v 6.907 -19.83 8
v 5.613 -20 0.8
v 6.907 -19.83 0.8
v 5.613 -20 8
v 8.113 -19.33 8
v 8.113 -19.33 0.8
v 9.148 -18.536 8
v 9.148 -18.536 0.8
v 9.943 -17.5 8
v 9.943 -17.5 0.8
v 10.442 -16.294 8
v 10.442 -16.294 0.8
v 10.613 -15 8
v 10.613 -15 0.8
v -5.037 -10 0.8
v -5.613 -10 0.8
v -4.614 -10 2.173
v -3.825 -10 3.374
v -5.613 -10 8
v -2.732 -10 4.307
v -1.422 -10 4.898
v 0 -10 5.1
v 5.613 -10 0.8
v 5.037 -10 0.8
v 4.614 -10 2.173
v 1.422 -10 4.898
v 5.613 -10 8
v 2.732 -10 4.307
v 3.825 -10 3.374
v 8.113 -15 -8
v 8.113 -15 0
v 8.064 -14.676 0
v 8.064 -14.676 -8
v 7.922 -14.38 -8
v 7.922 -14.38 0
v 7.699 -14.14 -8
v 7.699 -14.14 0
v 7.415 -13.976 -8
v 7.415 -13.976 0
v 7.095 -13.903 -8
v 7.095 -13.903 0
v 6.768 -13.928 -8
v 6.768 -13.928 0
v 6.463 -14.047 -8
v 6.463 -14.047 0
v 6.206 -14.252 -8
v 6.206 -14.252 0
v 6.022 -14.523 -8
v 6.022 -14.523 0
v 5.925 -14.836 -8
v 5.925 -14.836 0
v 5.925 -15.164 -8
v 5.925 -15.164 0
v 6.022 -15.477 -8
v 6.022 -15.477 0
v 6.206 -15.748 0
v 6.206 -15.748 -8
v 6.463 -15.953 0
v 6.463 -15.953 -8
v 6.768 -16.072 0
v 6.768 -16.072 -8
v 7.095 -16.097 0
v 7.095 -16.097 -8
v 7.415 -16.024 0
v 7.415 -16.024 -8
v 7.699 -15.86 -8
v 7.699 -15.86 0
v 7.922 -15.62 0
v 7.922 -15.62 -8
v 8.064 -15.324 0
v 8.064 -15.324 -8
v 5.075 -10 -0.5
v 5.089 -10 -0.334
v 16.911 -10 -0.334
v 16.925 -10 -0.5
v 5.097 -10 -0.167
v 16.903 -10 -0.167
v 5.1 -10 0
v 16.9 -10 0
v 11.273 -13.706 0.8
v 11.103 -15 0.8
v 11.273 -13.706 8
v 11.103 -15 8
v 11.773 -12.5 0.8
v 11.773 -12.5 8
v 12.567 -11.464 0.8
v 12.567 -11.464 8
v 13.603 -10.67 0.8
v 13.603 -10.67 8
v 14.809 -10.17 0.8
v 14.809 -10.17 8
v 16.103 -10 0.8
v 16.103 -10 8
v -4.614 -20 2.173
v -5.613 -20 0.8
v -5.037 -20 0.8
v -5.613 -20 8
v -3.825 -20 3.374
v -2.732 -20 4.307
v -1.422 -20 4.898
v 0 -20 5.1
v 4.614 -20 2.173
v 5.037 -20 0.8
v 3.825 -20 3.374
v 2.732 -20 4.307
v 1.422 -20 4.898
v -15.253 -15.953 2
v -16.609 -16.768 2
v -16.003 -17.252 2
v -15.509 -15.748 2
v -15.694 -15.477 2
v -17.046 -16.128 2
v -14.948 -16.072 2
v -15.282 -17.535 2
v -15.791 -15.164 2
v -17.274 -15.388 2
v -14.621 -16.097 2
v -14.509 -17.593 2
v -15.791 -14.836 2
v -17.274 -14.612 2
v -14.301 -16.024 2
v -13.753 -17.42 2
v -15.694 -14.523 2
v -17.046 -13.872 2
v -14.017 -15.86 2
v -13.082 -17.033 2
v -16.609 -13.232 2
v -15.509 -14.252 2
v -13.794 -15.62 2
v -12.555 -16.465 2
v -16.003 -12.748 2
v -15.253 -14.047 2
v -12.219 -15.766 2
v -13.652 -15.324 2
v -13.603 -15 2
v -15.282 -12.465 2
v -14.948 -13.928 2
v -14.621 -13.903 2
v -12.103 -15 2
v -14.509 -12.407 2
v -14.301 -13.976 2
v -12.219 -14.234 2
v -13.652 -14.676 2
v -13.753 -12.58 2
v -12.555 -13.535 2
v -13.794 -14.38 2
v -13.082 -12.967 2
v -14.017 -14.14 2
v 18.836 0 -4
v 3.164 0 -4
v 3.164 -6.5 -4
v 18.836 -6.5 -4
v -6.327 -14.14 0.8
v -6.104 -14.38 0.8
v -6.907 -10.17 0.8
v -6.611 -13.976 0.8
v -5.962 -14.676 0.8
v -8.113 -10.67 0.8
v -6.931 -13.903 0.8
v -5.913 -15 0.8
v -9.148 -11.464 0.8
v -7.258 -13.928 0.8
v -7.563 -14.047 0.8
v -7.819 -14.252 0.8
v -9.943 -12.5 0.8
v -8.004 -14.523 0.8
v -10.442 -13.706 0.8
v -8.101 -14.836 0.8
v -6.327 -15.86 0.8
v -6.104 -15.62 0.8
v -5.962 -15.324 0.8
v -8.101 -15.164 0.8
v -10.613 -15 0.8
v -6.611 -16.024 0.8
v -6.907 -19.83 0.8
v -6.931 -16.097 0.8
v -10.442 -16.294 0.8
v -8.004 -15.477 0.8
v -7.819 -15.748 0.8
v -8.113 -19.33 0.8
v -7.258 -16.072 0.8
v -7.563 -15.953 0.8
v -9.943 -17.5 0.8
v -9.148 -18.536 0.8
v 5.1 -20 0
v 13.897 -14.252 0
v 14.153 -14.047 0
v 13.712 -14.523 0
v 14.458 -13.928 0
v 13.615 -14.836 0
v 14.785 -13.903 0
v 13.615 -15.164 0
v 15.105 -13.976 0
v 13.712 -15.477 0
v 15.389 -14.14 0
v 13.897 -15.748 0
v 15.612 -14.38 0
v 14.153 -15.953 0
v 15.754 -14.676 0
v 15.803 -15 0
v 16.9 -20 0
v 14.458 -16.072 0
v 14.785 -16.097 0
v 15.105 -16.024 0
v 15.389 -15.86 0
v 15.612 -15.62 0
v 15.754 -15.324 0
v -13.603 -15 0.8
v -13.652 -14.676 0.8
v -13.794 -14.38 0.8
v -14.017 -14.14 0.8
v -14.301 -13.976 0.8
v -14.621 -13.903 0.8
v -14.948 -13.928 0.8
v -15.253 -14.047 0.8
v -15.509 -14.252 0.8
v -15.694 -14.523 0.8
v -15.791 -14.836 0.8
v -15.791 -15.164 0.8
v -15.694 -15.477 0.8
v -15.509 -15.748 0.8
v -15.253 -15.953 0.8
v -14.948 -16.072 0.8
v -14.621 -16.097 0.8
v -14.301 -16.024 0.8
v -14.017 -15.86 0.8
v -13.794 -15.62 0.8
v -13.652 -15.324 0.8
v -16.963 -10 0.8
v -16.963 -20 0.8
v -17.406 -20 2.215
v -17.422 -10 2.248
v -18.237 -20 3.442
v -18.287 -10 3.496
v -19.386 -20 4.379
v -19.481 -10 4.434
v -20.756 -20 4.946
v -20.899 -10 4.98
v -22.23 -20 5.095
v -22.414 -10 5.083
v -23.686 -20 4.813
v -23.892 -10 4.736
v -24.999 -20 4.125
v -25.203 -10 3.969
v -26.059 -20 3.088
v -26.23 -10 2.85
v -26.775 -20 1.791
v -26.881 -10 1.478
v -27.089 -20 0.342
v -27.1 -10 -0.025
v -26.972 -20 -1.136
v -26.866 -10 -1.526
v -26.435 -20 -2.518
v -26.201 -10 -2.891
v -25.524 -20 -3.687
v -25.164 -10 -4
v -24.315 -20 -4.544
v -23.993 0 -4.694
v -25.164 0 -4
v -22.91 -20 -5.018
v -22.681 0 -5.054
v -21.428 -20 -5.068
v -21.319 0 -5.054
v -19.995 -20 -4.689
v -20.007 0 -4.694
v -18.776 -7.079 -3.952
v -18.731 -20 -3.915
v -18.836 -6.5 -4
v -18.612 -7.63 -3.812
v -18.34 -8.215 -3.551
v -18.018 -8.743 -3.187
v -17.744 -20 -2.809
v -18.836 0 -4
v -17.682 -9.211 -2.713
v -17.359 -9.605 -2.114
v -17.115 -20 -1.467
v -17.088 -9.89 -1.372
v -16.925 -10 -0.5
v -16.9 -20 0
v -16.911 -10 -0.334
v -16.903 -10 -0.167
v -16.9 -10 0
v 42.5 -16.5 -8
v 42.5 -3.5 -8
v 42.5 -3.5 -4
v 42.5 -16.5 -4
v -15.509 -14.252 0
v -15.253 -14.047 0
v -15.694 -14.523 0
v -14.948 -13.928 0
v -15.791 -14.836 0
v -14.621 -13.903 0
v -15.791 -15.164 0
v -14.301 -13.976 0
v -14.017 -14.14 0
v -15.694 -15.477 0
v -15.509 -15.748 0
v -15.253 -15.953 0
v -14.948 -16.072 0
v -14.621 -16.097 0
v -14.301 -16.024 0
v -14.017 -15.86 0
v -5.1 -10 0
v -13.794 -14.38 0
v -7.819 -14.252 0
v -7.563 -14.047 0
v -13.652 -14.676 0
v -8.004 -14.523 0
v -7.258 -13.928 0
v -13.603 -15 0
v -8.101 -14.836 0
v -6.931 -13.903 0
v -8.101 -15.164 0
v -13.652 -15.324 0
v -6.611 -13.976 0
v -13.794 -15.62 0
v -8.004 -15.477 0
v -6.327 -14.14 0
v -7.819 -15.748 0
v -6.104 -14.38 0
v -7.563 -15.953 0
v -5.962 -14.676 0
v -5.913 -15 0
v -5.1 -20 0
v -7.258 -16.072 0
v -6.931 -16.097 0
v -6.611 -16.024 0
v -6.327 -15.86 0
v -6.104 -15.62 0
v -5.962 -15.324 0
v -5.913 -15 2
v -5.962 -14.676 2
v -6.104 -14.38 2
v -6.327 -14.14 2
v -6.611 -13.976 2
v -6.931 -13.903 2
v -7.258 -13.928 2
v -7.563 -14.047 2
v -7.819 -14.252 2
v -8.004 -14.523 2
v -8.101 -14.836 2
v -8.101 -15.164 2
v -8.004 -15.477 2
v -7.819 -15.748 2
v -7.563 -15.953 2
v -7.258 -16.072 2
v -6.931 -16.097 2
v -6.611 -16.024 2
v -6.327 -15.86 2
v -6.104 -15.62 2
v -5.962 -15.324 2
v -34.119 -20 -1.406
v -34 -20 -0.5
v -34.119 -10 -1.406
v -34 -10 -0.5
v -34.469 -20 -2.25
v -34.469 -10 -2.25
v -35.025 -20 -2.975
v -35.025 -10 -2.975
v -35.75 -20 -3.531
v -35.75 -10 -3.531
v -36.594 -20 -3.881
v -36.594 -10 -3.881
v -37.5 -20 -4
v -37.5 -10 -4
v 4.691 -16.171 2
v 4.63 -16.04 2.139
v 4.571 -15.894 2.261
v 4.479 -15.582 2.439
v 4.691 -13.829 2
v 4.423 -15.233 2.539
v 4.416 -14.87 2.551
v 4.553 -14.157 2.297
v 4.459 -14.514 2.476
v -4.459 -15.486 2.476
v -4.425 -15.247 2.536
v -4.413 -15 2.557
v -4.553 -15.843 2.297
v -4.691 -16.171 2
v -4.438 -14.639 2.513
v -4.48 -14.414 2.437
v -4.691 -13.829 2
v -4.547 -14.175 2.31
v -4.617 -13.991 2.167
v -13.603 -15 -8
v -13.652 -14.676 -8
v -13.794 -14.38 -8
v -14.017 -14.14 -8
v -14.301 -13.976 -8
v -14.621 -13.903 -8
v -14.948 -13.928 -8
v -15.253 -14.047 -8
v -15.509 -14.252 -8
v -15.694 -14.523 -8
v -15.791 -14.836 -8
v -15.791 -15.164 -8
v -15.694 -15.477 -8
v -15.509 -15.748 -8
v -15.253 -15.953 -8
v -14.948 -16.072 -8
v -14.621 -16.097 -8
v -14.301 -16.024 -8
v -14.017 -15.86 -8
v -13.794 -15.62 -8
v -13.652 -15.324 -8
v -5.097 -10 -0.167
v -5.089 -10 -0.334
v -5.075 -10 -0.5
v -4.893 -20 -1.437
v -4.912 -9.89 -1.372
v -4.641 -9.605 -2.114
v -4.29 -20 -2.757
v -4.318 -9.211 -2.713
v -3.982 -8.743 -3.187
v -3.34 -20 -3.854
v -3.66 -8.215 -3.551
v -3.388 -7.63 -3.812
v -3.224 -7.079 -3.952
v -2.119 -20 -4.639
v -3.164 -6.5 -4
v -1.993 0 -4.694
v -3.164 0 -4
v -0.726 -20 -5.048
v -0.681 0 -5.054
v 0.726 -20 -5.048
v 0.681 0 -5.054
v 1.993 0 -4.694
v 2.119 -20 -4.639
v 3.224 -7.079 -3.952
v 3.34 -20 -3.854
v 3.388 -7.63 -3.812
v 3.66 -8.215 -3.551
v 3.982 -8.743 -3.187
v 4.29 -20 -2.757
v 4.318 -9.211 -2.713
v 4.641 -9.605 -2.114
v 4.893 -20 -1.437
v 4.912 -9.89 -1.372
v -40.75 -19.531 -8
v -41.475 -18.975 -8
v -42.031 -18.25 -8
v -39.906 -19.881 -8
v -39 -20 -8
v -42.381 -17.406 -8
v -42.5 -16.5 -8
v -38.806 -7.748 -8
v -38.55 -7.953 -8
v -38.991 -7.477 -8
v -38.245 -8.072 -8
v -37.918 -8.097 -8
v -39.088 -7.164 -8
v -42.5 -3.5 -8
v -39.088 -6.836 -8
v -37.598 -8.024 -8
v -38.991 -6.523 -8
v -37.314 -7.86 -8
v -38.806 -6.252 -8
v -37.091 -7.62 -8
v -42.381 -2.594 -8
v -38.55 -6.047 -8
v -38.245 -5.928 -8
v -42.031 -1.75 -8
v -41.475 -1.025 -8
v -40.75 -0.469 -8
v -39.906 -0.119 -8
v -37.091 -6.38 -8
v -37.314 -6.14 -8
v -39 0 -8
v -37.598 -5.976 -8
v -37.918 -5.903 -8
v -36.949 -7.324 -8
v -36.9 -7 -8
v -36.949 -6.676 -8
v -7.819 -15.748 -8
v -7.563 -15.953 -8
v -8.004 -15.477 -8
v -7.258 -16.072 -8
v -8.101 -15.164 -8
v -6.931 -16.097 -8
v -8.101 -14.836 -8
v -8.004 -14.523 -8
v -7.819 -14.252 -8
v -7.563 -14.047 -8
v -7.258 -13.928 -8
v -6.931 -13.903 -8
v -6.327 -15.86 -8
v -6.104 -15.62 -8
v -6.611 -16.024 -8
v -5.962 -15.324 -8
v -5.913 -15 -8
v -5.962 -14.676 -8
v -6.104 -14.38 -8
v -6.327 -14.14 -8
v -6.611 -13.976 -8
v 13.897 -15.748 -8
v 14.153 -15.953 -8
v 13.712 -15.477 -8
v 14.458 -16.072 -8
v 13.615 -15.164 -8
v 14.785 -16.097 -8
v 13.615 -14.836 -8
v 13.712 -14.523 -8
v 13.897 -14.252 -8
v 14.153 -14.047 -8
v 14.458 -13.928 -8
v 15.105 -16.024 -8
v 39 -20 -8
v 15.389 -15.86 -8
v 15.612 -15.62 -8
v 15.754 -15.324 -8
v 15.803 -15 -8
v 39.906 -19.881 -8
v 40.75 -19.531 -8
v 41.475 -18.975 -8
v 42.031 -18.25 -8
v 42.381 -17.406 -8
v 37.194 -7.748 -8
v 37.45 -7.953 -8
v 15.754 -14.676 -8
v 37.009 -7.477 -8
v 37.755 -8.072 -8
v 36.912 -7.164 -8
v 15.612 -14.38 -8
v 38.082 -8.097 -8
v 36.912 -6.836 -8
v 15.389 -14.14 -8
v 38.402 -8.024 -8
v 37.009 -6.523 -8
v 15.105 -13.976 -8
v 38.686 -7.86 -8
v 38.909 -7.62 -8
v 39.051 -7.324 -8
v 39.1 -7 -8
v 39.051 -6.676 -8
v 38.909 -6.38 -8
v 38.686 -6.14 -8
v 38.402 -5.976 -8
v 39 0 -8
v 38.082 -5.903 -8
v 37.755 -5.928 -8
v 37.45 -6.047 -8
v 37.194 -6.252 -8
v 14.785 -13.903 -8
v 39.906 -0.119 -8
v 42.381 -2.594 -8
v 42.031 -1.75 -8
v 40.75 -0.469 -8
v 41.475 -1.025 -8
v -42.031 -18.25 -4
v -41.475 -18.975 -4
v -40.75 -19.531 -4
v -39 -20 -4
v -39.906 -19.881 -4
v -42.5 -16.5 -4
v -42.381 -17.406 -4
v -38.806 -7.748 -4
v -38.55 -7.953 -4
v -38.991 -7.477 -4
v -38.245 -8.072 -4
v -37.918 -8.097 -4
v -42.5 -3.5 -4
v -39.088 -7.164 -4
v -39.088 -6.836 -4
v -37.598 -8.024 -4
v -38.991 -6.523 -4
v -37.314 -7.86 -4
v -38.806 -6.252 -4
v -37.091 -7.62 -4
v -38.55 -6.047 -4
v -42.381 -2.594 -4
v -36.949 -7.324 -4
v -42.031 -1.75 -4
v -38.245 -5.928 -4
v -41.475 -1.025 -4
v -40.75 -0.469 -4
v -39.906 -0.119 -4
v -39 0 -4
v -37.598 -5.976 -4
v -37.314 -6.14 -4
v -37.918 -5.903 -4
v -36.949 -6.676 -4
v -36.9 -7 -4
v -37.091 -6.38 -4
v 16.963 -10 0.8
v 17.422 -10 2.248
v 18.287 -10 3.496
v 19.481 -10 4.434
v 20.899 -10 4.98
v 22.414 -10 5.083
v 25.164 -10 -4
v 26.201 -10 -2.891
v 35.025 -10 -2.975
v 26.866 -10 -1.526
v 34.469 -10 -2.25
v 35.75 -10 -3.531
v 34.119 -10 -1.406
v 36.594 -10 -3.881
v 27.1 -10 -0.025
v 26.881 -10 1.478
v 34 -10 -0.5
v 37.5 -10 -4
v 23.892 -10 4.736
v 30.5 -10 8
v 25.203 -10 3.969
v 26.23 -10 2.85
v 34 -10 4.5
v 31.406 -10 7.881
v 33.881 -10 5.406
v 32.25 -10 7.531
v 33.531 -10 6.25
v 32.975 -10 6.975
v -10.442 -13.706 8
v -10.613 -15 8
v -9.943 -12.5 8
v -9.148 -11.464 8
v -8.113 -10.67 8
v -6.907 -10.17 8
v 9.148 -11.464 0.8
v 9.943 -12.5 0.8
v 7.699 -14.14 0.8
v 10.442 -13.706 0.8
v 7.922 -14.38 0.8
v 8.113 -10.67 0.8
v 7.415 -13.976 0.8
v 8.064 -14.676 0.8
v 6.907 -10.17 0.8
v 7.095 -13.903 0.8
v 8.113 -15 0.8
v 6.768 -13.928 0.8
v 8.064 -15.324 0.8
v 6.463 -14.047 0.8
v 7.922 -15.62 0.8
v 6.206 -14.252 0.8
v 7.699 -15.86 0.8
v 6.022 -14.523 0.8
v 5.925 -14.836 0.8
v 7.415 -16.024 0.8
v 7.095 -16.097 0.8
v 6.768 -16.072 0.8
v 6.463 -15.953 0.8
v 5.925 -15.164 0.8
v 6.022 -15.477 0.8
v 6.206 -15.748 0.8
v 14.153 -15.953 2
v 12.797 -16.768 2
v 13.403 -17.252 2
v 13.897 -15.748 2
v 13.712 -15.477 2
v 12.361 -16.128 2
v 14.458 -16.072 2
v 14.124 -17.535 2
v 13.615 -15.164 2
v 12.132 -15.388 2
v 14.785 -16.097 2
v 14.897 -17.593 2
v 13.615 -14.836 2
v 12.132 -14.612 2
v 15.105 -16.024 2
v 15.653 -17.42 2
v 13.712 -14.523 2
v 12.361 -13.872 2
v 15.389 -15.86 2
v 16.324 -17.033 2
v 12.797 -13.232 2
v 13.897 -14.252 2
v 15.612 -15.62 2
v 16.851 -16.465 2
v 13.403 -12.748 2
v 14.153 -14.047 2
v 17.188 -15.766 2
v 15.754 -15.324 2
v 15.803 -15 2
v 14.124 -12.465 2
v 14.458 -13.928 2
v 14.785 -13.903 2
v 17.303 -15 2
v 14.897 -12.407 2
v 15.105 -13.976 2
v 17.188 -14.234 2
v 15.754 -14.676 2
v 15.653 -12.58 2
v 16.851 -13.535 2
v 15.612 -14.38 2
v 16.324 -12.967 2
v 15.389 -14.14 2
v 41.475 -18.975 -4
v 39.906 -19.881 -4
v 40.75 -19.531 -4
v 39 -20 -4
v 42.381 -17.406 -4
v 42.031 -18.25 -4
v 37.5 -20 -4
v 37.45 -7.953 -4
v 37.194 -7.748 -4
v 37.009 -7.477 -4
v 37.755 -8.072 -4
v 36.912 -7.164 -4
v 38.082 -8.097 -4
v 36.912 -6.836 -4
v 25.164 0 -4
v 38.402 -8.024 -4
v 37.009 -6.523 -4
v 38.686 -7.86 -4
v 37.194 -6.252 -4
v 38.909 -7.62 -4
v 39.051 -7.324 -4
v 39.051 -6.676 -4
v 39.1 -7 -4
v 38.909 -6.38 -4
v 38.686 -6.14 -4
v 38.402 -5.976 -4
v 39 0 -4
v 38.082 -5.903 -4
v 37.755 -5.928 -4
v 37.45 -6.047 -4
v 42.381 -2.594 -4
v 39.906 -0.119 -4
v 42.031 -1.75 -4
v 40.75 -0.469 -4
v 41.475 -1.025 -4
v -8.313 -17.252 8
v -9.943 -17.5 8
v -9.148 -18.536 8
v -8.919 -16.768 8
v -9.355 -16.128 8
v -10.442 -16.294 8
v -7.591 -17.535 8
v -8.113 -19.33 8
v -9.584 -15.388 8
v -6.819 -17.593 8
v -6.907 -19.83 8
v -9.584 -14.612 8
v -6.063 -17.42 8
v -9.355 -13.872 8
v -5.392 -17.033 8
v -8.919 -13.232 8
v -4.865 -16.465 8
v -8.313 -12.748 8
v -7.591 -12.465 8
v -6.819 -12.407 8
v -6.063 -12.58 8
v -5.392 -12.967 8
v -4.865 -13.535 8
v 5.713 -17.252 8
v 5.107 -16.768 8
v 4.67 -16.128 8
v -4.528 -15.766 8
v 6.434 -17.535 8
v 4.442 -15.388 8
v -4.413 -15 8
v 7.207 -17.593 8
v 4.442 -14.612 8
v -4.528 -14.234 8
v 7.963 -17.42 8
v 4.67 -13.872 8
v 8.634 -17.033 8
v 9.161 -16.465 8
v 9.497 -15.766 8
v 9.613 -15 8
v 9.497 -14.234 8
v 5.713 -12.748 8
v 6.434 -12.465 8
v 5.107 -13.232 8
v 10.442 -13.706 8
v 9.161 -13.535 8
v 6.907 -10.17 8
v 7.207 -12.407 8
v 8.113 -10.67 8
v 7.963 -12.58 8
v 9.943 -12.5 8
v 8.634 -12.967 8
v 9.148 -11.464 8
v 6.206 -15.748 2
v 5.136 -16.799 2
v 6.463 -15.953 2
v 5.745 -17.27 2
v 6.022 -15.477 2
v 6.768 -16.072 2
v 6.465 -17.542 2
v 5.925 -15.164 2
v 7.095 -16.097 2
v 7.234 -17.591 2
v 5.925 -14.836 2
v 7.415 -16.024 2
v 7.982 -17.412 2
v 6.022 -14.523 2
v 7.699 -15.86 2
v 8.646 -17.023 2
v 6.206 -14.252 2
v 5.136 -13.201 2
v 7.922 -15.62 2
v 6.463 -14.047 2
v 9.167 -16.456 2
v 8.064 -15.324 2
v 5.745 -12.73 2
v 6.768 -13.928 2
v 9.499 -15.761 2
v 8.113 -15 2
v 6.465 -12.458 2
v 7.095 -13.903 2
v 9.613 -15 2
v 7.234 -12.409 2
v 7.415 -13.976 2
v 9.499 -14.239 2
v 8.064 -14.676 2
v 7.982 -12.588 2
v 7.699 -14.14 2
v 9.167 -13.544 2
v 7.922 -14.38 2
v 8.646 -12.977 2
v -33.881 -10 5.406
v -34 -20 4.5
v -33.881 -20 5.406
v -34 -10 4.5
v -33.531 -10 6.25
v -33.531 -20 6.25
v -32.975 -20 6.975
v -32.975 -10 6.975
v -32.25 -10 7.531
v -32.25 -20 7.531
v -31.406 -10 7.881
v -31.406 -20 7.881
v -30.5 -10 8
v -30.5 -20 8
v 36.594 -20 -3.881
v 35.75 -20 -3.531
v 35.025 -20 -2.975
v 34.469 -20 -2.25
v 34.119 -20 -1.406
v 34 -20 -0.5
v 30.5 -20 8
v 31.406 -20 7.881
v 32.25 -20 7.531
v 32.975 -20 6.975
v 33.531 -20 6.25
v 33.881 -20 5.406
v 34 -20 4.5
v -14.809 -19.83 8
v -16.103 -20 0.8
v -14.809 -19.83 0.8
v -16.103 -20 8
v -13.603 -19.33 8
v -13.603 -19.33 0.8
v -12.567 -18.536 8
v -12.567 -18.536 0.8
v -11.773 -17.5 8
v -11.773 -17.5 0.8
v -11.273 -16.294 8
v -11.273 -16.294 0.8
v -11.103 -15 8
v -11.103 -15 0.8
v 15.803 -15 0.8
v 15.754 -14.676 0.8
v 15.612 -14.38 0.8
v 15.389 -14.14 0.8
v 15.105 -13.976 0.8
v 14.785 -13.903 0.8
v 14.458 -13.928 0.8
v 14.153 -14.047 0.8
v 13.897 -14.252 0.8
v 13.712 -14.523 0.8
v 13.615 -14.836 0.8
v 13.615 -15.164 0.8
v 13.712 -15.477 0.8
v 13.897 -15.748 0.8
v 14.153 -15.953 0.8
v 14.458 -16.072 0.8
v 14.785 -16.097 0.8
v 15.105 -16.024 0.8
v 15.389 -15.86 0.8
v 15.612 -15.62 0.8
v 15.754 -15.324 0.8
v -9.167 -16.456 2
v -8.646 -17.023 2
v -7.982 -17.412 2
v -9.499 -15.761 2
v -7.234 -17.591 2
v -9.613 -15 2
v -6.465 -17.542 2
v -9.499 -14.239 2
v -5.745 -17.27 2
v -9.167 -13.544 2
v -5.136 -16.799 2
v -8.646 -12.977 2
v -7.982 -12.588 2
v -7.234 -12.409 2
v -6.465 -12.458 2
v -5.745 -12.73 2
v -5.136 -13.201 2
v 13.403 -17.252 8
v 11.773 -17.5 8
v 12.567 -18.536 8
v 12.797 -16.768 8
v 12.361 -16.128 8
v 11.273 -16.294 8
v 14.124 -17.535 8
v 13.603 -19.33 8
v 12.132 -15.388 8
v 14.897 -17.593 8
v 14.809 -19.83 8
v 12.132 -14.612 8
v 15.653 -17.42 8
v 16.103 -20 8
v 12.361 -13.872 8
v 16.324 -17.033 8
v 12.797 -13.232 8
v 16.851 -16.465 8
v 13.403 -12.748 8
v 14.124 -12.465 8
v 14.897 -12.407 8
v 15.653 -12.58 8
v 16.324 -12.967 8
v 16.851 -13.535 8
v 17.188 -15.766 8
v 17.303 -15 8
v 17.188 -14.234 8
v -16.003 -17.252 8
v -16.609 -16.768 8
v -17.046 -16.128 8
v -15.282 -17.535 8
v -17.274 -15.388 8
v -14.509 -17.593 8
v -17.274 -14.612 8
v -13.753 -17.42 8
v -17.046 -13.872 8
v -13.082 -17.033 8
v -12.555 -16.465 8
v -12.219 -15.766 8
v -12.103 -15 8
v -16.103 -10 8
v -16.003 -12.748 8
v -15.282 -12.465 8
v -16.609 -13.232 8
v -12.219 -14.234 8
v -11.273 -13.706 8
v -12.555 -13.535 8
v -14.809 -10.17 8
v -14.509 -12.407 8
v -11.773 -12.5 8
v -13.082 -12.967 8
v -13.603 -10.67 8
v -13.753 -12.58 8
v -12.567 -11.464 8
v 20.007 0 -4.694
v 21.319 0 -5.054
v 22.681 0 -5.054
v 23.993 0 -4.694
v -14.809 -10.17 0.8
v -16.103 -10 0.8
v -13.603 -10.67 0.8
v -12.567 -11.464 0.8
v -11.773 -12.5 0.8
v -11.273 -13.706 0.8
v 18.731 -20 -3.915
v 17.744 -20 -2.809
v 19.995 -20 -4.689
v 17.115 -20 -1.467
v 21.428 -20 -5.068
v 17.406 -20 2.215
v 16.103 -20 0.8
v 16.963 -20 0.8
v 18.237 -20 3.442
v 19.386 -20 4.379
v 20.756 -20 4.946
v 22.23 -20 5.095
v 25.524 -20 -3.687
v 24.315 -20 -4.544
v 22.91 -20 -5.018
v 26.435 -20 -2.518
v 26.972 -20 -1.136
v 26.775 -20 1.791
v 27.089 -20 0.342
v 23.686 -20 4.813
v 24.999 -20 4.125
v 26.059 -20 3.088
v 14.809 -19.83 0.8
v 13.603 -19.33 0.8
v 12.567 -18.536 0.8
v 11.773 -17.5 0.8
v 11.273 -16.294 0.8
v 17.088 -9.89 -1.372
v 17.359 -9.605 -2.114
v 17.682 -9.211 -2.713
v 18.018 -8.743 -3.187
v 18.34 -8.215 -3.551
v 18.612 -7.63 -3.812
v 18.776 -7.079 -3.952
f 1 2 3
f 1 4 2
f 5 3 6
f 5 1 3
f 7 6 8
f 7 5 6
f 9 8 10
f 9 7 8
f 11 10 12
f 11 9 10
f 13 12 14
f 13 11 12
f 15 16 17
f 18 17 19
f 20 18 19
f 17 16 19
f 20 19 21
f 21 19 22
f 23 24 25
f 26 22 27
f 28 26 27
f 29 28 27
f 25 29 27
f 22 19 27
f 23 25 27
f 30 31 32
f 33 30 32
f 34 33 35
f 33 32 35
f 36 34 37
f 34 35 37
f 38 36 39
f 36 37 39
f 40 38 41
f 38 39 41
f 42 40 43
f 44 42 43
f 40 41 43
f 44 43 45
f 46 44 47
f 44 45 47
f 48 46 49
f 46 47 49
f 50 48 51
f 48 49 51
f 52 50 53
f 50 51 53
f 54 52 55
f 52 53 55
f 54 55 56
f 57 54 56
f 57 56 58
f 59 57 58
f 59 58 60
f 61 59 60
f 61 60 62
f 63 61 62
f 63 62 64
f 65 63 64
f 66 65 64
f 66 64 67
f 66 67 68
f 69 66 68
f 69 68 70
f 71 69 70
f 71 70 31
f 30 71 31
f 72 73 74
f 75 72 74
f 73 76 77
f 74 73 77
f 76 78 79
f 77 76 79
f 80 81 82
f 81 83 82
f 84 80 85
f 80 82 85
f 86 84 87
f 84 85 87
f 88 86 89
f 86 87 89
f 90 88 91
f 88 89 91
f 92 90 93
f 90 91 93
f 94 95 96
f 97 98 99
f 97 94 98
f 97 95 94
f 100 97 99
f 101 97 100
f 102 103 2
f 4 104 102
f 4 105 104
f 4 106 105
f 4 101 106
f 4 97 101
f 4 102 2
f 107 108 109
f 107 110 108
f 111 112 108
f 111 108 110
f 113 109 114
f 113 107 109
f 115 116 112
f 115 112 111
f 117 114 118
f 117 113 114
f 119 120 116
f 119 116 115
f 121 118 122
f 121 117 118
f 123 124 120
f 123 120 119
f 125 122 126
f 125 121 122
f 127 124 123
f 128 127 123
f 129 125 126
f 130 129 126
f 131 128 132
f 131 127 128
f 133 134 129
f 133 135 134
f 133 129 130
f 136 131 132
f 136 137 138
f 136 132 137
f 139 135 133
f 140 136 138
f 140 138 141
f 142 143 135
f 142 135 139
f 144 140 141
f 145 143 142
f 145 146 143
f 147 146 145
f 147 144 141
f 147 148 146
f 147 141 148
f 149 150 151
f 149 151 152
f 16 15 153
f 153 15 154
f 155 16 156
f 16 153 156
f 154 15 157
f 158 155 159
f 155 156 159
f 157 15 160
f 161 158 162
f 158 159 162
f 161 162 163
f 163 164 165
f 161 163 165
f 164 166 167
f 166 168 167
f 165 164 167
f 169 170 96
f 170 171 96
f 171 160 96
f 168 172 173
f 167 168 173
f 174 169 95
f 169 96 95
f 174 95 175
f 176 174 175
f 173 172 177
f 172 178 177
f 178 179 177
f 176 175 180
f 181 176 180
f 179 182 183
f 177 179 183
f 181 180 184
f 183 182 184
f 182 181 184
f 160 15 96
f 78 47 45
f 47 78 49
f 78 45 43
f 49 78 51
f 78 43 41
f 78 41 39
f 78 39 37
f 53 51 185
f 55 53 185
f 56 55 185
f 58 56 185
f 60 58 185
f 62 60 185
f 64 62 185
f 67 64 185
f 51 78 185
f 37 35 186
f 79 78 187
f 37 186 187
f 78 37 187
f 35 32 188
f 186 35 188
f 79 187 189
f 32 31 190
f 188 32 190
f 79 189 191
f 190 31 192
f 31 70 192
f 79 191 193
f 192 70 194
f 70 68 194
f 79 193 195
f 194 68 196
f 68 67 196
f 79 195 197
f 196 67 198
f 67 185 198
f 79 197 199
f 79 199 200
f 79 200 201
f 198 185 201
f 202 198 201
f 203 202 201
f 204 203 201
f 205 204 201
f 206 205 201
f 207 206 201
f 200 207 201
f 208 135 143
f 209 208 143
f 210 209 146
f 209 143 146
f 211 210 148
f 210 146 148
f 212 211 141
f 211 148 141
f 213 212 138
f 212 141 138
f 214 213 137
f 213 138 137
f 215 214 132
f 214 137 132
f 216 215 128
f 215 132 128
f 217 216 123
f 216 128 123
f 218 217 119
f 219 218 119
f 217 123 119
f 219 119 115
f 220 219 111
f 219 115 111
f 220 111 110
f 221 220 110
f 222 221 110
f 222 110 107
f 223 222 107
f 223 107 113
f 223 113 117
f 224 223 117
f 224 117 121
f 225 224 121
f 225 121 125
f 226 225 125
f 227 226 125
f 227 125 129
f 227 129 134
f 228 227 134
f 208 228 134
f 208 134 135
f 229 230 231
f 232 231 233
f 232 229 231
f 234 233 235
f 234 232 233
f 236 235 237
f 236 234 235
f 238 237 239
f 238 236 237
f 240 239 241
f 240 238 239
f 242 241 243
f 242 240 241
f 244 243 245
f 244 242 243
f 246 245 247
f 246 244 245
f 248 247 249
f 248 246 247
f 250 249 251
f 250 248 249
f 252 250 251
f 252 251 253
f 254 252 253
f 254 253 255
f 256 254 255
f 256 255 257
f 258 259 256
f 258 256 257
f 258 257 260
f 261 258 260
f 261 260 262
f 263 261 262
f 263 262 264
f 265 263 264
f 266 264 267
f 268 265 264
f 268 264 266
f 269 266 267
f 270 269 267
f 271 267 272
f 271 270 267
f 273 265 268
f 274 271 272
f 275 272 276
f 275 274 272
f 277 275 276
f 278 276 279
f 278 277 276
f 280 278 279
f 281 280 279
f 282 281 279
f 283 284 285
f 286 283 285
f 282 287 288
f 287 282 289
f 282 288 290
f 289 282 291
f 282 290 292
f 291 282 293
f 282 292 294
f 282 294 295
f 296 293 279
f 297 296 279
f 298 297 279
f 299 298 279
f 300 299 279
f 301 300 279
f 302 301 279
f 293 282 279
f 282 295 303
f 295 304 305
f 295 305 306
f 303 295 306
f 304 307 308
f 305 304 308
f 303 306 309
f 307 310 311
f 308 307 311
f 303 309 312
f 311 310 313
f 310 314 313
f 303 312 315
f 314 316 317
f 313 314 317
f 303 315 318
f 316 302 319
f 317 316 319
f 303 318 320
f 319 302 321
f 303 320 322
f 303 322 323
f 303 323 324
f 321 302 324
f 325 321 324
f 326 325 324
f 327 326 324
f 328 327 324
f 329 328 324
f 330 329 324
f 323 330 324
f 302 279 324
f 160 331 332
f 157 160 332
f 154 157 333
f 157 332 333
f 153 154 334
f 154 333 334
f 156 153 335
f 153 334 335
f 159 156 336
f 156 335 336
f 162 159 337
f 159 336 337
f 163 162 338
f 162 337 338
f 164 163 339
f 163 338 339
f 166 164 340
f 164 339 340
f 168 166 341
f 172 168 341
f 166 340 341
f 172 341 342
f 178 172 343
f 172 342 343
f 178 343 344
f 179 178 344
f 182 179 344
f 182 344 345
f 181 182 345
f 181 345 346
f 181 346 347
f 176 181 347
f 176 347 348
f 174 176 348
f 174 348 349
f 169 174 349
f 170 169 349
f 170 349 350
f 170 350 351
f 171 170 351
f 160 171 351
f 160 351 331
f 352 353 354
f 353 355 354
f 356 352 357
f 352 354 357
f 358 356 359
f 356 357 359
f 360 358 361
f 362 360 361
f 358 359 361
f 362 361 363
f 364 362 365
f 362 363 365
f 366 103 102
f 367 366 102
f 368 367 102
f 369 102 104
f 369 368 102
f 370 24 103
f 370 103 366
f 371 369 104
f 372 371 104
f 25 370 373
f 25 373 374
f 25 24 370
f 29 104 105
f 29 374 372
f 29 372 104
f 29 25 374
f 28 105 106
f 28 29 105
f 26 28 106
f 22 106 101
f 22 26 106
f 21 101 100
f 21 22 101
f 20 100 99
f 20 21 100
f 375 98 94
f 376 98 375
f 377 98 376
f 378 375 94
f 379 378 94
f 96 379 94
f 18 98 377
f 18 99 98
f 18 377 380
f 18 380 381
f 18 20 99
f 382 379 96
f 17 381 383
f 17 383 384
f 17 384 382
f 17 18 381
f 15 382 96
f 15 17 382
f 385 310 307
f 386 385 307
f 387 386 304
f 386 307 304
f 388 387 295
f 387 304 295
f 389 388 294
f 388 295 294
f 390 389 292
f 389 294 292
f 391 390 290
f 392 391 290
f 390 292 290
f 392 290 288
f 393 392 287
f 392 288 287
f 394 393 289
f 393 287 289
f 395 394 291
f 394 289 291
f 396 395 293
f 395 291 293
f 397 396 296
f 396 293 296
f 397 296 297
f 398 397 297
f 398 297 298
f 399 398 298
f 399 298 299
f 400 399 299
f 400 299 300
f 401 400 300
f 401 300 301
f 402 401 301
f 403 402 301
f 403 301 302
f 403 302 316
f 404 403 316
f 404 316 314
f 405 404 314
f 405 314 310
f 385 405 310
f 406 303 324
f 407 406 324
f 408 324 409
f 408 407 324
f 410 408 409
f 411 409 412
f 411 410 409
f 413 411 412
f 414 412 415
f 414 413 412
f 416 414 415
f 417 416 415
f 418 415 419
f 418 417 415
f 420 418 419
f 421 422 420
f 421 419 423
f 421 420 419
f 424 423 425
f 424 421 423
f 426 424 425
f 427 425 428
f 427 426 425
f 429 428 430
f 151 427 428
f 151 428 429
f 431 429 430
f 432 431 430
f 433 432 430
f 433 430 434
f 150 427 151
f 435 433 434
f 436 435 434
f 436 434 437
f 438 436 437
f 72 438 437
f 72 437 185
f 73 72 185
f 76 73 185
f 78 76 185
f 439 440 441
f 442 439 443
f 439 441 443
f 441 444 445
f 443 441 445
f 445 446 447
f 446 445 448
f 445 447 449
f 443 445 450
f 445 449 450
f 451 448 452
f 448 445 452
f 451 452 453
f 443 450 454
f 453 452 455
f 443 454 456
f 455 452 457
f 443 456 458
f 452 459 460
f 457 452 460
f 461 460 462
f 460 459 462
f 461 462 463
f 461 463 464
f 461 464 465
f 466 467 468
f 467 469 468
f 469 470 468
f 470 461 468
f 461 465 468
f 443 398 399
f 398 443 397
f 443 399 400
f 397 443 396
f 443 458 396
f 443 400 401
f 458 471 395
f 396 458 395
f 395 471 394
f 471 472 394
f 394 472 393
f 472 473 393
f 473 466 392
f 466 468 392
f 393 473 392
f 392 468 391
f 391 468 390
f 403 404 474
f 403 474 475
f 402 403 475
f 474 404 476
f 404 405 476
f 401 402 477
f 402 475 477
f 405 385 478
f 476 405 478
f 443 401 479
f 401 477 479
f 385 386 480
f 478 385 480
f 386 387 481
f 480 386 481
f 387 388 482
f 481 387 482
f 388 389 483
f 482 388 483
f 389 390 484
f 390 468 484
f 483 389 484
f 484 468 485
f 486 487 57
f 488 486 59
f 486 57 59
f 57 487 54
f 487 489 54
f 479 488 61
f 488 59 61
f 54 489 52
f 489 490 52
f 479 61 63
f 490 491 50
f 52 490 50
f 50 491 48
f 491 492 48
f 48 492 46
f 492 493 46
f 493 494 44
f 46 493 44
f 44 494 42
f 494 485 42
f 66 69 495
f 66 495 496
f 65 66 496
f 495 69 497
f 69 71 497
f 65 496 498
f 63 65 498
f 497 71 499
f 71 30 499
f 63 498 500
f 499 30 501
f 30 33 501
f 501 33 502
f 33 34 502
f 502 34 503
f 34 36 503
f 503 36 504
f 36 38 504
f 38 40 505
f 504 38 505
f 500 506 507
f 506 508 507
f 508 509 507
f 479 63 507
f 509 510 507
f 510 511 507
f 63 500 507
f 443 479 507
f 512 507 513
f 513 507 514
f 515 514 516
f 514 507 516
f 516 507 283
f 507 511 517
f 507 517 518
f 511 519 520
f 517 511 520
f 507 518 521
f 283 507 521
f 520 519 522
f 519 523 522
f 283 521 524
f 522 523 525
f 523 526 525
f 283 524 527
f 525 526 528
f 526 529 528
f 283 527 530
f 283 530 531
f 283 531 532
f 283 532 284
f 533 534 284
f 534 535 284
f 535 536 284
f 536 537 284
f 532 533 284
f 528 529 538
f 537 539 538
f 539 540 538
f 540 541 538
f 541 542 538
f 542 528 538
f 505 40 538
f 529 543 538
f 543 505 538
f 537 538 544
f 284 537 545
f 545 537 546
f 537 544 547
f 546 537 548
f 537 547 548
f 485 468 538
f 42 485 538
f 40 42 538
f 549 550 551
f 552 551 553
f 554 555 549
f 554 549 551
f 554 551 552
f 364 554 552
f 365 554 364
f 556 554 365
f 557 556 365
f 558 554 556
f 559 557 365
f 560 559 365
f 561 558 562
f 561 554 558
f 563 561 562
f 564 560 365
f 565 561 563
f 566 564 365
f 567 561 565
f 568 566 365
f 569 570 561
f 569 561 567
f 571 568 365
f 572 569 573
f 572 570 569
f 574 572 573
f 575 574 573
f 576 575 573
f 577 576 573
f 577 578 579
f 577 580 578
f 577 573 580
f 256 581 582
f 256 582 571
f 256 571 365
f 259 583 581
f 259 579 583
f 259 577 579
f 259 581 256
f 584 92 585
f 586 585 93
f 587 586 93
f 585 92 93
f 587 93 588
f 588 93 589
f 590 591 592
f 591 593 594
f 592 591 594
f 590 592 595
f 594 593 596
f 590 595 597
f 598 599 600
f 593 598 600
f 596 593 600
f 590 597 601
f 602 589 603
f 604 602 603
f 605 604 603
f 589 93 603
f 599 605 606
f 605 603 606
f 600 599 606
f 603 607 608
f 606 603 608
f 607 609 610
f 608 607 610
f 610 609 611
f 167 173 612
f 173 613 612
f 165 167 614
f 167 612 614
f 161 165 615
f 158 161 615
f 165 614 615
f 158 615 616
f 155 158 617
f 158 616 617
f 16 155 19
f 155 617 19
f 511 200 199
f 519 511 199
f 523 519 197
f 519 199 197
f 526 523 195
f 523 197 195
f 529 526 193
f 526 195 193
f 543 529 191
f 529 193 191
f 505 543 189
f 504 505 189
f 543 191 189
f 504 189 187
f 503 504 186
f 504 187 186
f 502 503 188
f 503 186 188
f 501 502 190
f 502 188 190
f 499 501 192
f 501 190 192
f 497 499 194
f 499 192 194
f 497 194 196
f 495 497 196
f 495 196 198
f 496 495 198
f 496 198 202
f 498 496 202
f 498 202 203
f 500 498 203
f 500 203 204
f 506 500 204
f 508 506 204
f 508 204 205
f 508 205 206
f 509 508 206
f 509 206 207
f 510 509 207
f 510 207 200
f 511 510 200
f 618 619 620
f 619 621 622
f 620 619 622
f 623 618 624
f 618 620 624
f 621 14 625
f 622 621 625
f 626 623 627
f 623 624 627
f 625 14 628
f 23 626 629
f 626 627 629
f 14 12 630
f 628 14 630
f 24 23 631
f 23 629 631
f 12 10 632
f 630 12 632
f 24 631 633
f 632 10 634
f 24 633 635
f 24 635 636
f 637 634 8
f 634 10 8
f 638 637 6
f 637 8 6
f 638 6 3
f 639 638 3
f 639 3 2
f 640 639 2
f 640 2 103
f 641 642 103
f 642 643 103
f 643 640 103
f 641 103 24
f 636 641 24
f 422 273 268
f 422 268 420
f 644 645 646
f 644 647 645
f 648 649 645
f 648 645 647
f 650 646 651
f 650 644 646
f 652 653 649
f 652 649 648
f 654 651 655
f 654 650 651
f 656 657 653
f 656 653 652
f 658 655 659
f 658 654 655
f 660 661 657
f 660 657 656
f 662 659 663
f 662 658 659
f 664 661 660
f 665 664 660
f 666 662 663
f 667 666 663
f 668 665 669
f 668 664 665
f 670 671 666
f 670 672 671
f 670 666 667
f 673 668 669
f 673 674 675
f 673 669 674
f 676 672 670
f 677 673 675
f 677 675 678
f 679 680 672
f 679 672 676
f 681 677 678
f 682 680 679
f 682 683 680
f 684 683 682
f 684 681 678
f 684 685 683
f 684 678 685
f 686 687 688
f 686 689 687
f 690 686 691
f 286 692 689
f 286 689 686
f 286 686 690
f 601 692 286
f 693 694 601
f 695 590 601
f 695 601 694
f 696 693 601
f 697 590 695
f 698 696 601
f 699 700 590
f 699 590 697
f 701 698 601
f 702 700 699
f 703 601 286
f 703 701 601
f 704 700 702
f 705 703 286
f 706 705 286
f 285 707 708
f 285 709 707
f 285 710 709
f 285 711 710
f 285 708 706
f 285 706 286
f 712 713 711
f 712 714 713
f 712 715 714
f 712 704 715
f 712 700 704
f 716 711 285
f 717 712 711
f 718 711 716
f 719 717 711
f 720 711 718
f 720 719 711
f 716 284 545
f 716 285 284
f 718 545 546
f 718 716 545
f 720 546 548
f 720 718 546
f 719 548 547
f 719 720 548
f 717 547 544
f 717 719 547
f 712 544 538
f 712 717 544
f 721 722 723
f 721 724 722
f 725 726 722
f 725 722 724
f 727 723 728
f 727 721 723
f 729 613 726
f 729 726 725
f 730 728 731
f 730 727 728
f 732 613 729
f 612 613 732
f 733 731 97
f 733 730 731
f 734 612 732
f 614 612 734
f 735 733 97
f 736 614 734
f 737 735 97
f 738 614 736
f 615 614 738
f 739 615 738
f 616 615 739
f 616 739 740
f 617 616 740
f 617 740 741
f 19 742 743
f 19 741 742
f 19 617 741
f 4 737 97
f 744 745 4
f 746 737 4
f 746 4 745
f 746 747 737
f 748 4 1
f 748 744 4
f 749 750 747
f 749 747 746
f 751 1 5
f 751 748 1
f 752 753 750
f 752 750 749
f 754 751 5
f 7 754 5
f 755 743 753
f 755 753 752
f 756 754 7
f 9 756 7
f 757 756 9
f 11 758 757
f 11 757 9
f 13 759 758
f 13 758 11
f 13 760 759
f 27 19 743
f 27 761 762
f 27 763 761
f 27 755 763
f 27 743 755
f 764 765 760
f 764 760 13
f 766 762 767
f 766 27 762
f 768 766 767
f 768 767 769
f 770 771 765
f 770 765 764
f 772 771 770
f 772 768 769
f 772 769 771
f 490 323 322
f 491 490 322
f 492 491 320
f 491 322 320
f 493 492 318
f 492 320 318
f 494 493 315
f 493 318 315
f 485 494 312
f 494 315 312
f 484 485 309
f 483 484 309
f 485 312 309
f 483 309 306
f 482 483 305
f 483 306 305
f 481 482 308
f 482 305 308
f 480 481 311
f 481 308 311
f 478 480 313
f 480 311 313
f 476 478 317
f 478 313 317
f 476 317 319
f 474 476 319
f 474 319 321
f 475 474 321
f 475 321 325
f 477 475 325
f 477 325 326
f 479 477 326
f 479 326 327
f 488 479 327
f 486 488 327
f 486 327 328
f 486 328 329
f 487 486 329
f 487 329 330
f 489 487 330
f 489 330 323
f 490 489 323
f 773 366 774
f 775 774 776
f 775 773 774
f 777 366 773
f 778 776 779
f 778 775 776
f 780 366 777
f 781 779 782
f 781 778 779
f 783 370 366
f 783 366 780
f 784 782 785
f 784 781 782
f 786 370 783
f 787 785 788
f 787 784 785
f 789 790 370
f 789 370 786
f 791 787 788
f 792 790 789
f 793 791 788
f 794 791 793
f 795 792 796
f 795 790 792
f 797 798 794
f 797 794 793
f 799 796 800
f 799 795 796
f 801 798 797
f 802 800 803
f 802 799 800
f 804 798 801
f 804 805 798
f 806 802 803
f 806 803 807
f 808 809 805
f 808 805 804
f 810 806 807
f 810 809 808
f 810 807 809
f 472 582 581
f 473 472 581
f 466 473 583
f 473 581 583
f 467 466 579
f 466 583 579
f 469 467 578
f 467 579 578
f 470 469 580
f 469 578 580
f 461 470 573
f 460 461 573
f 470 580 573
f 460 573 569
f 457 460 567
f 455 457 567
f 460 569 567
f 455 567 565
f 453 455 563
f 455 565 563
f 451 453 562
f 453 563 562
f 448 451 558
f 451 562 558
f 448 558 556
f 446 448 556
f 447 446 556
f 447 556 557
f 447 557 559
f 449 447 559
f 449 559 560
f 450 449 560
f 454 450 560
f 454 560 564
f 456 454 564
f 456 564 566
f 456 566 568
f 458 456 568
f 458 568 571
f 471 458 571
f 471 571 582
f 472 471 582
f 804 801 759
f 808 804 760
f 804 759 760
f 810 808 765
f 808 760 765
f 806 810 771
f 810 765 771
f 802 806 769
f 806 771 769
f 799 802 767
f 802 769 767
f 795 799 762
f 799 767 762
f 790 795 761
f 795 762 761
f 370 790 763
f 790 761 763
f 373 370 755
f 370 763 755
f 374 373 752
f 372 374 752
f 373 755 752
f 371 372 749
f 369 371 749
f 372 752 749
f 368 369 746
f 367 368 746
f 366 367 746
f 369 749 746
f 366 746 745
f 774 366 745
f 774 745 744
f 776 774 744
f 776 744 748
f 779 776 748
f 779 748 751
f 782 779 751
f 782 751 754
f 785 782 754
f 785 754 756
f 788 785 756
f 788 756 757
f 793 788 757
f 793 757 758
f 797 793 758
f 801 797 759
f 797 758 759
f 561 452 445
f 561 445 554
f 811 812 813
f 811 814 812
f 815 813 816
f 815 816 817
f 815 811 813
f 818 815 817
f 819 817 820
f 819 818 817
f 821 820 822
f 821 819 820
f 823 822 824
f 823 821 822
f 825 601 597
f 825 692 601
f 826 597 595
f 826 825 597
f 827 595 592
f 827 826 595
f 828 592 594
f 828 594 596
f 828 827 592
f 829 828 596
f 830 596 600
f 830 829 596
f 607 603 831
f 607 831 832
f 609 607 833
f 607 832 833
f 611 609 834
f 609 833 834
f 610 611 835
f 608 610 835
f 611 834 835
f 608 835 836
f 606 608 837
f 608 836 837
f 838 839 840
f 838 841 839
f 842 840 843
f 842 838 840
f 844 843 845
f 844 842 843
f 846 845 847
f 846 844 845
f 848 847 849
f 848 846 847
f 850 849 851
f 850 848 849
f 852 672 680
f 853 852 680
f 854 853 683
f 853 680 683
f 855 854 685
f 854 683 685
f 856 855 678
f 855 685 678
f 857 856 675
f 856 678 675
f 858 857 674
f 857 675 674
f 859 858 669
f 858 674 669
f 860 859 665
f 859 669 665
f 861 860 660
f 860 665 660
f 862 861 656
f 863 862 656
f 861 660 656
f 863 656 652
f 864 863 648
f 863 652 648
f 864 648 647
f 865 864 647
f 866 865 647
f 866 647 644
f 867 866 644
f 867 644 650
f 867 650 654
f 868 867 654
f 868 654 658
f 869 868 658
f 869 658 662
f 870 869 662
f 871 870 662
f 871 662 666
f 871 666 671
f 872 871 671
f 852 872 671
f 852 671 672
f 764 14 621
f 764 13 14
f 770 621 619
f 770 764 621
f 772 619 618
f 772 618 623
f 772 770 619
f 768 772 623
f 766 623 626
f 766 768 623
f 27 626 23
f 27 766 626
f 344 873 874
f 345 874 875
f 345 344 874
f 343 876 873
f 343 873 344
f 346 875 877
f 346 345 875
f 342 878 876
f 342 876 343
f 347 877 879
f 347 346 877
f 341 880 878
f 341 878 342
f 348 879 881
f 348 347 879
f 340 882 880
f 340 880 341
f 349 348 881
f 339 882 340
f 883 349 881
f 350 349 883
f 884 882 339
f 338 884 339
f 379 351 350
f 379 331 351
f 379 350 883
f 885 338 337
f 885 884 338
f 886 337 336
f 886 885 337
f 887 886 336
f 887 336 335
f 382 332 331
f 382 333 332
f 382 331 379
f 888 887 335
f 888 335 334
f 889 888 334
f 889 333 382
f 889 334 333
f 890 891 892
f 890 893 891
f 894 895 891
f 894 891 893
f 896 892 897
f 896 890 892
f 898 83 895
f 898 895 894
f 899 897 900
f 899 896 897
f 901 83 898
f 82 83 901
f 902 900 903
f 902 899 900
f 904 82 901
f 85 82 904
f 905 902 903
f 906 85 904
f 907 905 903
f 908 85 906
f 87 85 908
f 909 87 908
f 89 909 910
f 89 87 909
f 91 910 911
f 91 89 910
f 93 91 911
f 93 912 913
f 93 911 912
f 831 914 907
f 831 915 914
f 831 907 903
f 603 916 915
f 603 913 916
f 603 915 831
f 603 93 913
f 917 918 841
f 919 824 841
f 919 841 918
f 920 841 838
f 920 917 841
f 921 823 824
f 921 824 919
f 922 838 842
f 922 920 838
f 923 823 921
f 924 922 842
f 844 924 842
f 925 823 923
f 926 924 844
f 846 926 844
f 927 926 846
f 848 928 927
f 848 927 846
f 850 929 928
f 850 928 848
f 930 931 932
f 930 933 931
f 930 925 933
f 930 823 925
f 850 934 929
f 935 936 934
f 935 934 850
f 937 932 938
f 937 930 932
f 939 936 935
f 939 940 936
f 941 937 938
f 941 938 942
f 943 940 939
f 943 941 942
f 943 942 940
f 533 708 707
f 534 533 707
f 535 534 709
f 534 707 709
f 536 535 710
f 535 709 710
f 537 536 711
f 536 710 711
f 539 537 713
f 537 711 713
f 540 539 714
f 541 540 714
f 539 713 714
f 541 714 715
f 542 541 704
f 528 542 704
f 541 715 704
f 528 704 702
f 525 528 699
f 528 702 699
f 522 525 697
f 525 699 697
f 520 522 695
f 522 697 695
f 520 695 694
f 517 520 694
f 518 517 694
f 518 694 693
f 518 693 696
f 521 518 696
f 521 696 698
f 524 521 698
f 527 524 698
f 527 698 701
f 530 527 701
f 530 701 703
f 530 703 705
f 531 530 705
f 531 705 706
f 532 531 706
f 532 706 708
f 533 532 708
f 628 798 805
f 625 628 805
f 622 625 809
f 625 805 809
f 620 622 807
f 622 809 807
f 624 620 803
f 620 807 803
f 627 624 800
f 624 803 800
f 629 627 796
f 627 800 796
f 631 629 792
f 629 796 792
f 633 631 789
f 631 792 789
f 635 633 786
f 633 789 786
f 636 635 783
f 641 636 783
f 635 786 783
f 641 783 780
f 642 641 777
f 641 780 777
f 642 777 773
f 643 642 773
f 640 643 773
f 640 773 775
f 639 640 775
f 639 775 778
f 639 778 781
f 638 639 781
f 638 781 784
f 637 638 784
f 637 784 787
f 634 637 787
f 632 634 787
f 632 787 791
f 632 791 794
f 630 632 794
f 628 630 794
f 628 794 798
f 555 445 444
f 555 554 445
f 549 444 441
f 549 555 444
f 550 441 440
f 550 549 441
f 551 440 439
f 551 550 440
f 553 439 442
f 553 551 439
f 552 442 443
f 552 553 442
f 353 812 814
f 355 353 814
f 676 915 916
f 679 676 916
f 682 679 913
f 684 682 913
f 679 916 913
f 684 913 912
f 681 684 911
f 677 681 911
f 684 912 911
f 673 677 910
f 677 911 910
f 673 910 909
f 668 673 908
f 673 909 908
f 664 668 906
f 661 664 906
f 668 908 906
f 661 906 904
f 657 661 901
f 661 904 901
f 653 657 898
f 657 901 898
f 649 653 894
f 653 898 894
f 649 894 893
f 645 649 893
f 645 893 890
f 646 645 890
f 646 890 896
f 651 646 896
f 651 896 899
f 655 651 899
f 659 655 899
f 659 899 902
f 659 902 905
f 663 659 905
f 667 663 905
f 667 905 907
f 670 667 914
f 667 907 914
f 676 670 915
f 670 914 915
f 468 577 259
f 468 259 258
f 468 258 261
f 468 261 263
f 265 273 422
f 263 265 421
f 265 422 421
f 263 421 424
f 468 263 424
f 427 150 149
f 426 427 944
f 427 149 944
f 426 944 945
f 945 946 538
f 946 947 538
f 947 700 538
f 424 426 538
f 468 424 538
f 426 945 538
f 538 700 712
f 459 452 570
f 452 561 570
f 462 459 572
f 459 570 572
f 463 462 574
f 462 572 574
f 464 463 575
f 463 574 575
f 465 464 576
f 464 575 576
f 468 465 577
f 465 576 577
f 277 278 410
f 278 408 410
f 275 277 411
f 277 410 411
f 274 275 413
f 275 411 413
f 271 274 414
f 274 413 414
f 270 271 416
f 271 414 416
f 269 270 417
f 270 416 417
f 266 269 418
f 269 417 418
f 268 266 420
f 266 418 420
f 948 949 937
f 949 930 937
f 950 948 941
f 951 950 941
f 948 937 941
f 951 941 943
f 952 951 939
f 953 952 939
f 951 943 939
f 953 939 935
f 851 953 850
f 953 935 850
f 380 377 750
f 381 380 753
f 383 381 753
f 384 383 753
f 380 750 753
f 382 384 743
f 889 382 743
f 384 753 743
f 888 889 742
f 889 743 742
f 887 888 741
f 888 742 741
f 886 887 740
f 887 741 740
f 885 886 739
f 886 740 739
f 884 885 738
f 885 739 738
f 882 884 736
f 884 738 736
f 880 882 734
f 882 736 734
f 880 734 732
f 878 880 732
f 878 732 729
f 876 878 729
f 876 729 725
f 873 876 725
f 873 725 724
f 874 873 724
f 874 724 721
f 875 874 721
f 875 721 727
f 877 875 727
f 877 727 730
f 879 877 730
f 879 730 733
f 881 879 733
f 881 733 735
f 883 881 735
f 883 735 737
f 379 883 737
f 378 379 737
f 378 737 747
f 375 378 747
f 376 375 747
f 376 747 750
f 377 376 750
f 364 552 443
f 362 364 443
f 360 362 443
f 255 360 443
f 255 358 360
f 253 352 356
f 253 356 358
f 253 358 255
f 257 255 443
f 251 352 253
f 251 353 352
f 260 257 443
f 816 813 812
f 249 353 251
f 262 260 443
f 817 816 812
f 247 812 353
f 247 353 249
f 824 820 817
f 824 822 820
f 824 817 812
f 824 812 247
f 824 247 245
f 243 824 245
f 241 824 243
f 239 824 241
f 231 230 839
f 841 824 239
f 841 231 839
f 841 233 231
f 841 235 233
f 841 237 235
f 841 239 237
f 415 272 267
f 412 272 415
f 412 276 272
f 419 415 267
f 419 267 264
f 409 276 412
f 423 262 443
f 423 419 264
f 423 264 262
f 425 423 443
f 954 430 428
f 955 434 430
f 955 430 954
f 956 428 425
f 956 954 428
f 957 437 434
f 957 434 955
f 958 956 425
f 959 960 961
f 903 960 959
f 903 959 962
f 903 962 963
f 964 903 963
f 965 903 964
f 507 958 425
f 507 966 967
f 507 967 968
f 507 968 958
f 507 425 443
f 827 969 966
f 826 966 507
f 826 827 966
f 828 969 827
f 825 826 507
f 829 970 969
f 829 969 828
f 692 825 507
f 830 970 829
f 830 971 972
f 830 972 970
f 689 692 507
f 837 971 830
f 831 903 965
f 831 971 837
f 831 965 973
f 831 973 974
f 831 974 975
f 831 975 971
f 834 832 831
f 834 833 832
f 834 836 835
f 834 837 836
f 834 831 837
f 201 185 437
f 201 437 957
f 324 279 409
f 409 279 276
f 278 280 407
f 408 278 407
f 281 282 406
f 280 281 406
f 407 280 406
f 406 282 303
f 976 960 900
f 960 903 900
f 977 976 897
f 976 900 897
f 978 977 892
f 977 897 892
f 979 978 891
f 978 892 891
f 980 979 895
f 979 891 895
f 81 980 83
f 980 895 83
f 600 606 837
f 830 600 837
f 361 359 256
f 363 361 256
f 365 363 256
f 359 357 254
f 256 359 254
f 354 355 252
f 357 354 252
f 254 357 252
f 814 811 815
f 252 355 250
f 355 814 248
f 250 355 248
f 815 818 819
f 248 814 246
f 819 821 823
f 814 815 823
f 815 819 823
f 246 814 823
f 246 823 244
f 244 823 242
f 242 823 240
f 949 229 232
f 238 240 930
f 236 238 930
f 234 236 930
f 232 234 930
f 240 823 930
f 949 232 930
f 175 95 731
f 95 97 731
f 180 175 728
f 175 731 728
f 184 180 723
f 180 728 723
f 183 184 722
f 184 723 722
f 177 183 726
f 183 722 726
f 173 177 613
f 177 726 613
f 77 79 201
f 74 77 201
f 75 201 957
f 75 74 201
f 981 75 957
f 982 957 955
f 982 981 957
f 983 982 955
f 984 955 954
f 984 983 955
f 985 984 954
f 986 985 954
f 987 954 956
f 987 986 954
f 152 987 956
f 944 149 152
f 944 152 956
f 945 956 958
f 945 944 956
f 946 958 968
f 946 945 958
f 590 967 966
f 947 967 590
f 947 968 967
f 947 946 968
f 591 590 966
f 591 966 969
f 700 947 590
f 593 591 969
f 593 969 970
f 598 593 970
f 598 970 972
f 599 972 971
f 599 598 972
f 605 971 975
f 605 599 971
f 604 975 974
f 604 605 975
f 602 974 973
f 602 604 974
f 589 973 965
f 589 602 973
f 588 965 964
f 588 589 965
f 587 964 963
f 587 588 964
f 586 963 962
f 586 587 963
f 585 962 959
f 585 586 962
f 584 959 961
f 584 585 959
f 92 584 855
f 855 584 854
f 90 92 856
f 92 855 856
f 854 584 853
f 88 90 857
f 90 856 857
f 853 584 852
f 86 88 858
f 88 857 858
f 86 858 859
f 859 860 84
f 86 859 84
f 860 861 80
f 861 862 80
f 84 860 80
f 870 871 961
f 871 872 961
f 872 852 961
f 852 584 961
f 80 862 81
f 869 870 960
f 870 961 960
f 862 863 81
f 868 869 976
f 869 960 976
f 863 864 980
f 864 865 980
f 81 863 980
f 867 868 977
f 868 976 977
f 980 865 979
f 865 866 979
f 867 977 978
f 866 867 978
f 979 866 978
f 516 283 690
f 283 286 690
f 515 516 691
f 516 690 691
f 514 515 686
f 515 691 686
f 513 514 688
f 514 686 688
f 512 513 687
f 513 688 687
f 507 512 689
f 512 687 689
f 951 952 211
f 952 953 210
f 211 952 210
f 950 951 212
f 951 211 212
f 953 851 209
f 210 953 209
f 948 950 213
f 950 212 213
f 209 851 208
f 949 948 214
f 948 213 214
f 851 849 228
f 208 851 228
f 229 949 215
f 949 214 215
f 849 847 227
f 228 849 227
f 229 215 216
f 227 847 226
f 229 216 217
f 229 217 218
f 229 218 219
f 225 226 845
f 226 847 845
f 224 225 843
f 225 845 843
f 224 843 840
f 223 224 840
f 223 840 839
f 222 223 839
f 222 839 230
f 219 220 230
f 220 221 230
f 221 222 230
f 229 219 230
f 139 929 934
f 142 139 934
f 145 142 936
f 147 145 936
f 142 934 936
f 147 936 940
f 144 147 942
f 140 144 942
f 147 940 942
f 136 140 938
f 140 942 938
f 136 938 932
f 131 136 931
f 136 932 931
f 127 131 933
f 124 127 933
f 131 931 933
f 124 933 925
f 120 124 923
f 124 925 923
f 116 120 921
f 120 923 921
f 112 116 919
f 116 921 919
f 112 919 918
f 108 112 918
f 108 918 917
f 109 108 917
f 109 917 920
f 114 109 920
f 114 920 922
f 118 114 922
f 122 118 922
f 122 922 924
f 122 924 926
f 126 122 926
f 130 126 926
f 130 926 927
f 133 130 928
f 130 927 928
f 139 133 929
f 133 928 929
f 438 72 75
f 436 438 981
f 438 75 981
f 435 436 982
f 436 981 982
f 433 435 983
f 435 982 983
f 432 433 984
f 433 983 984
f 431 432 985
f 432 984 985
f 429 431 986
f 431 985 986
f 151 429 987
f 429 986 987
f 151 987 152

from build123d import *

# Parameters (mm, degrees)
F0_W      = 85
F0_H      = 16
F0_R      = 5.1
F1_DEPTH  = 20
F2_W      = 68
F2_H      = 10
F3_DEPTH  = 12
F4_W      = 0.4902059005
F4_H      = 7.2
F5_DEPTH  = 25
F6_R      = 3.5
F7_R      = 1.1
F8_DEPTH  = 25
F9_R      = 4.99999
F10_R     = 1.1
F11_DEPTH = 25
F12_R     = 2.6
F12_R_2   = 1.1
F13_DEPTH = 6


# Not quite as in the source:
# - a fillet or chamfer is up to 0.001 mm smaller than in the source, because OpenCascade refuses the exact size


with BuildPart() as f1:
    # F0 (on Front) → F1 (new body)
    with BuildSketch(Plane.XZ):
        Rectangle(F0_W, F0_H)
        with Locations((-22, 0)):
            Circle(F0_R, mode=Mode.SUBTRACT)
        Circle(F0_R, mode=Mode.SUBTRACT)
        with Locations((22, 0)):
            Circle(F0_R, mode=Mode.SUBTRACT)
    extrude(amount=F1_DEPTH)

    # F2 (on face) → F3 (cut)
    with BuildSketch(Plane.XY.offset(8)):
        Polygon((42.5, -20), (42.5, 0), (34, 0), (34, -10), (34, -20), align=None)
        with Locations((0, -5)):
            Rectangle(F2_W, F2_H)
        Polygon((-34, -10), (-34, 0), (-42.5, 0), (-42.5, -20), (-34, -20), align=None)
    extrude(amount=-F3_DEPTH, mode=Mode.SUBTRACT)

    # F4 (on face) → F5 (cut)
    with BuildSketch(Plane.XZ.offset(20)):
        Polygon((-11.1030349508, 0.8), (-17.6240189229, 0.8), (-17.6240189229, 0), (-3.6016391778, 0), (-3.6016391778, 0.8), (-10.6128290503, 0.8), align=None)
        with Locations((-10.8579320006, 4.4)):
            Rectangle(F4_W, F4_H)
        Polygon((4.212562261, 0.8), (4.212562261, 0), (21.7539005794, 0), (21.7539005794, 0.8), (11.1030349508, 0.8), (10.6128290503, 0.8), align=None)
        with Locations((10.8579320006, 4.4)):
            Rectangle(F4_W, F4_H)
    extrude(amount=-F5_DEPTH, mode=Mode.SUBTRACT)

    # F6
    f6_edges = [f1.edges().sort_by_distance(p)[0] for p in [
        (-34, -15, 8),
        (34, -15, 8),
        (-34, -15, -4),
        (34, -15, -4),
        (-42.5, -20, -6),
        (-42.5, 0, -6),
        (42.5, -20, -6),
        (42.5, 0, -6),
        (11, -10, -4),
        (-11, -10, -4),
    ]]
    fillet(f6_edges, radius=F6_R)

    # F7 (on face) → F8 (cut)
    with BuildSketch(Plane.XY.offset(8)):
        with Locations((-14.7030349508, -15)):
            Circle(F7_R)
        with Locations((-7.0128290503, -15)):
            Circle(F7_R)
        with Locations((7.0128290503, -15)):
            Circle(F7_R)
        with Locations((14.7030349508, -15)):
            Circle(F7_R)
    extrude(amount=-F8_DEPTH, mode=Mode.SUBTRACT)

    # F9 (radius 5 in the source; OpenCascade refuses exactly that, so slightly less here)
    f9_edges = [f1.edges().sort_by_distance(p)[0] for p in [
        (-11.103035, -20, 4.4),
        (-10.612829, -20, 4.4),
        (10.612829, -20, 4.4),
        (11.103035, -20, 4.4),
        (11.103035, -10, 4.4),
        (10.612829, -10, 4.4),
        (-10.612829, -10, 4.4),
        (-11.103035, -10, 4.4),
    ]]
    fillet(f9_edges, radius=F9_R)

    # F10 (on face) → F11 (cut)
    with BuildSketch(Plane.XY.offset(-4)):
        with Locations((38, -7)):
            Circle(F10_R)
        with Locations((-38, -7)):
            Circle(F10_R)
    extrude(amount=-F11_DEPTH, mode=Mode.SUBTRACT)

    # F12 (on face) → F13 (cut)
    with BuildSketch(Plane.XY.offset(8)):
        with Locations((-14.7030349508, -15)):
            Circle(F12_R)
        with Locations((-7.0128290503, -15)):
            Circle(F12_R)
        with Locations((-7.0128290503, -15)):
            Circle(F12_R_2, mode=Mode.SUBTRACT)
        with Locations((7.0128290503, -15)):
            Circle(F12_R)
        with Locations((7.0128290503, -15)):
            Circle(F12_R_2, mode=Mode.SUBTRACT)
        with Locations((14.7030349508, -15)):
            Circle(F12_R)
    extrude(amount=-F13_DEPTH, mode=Mode.SUBTRACT)


solid = f1.part
